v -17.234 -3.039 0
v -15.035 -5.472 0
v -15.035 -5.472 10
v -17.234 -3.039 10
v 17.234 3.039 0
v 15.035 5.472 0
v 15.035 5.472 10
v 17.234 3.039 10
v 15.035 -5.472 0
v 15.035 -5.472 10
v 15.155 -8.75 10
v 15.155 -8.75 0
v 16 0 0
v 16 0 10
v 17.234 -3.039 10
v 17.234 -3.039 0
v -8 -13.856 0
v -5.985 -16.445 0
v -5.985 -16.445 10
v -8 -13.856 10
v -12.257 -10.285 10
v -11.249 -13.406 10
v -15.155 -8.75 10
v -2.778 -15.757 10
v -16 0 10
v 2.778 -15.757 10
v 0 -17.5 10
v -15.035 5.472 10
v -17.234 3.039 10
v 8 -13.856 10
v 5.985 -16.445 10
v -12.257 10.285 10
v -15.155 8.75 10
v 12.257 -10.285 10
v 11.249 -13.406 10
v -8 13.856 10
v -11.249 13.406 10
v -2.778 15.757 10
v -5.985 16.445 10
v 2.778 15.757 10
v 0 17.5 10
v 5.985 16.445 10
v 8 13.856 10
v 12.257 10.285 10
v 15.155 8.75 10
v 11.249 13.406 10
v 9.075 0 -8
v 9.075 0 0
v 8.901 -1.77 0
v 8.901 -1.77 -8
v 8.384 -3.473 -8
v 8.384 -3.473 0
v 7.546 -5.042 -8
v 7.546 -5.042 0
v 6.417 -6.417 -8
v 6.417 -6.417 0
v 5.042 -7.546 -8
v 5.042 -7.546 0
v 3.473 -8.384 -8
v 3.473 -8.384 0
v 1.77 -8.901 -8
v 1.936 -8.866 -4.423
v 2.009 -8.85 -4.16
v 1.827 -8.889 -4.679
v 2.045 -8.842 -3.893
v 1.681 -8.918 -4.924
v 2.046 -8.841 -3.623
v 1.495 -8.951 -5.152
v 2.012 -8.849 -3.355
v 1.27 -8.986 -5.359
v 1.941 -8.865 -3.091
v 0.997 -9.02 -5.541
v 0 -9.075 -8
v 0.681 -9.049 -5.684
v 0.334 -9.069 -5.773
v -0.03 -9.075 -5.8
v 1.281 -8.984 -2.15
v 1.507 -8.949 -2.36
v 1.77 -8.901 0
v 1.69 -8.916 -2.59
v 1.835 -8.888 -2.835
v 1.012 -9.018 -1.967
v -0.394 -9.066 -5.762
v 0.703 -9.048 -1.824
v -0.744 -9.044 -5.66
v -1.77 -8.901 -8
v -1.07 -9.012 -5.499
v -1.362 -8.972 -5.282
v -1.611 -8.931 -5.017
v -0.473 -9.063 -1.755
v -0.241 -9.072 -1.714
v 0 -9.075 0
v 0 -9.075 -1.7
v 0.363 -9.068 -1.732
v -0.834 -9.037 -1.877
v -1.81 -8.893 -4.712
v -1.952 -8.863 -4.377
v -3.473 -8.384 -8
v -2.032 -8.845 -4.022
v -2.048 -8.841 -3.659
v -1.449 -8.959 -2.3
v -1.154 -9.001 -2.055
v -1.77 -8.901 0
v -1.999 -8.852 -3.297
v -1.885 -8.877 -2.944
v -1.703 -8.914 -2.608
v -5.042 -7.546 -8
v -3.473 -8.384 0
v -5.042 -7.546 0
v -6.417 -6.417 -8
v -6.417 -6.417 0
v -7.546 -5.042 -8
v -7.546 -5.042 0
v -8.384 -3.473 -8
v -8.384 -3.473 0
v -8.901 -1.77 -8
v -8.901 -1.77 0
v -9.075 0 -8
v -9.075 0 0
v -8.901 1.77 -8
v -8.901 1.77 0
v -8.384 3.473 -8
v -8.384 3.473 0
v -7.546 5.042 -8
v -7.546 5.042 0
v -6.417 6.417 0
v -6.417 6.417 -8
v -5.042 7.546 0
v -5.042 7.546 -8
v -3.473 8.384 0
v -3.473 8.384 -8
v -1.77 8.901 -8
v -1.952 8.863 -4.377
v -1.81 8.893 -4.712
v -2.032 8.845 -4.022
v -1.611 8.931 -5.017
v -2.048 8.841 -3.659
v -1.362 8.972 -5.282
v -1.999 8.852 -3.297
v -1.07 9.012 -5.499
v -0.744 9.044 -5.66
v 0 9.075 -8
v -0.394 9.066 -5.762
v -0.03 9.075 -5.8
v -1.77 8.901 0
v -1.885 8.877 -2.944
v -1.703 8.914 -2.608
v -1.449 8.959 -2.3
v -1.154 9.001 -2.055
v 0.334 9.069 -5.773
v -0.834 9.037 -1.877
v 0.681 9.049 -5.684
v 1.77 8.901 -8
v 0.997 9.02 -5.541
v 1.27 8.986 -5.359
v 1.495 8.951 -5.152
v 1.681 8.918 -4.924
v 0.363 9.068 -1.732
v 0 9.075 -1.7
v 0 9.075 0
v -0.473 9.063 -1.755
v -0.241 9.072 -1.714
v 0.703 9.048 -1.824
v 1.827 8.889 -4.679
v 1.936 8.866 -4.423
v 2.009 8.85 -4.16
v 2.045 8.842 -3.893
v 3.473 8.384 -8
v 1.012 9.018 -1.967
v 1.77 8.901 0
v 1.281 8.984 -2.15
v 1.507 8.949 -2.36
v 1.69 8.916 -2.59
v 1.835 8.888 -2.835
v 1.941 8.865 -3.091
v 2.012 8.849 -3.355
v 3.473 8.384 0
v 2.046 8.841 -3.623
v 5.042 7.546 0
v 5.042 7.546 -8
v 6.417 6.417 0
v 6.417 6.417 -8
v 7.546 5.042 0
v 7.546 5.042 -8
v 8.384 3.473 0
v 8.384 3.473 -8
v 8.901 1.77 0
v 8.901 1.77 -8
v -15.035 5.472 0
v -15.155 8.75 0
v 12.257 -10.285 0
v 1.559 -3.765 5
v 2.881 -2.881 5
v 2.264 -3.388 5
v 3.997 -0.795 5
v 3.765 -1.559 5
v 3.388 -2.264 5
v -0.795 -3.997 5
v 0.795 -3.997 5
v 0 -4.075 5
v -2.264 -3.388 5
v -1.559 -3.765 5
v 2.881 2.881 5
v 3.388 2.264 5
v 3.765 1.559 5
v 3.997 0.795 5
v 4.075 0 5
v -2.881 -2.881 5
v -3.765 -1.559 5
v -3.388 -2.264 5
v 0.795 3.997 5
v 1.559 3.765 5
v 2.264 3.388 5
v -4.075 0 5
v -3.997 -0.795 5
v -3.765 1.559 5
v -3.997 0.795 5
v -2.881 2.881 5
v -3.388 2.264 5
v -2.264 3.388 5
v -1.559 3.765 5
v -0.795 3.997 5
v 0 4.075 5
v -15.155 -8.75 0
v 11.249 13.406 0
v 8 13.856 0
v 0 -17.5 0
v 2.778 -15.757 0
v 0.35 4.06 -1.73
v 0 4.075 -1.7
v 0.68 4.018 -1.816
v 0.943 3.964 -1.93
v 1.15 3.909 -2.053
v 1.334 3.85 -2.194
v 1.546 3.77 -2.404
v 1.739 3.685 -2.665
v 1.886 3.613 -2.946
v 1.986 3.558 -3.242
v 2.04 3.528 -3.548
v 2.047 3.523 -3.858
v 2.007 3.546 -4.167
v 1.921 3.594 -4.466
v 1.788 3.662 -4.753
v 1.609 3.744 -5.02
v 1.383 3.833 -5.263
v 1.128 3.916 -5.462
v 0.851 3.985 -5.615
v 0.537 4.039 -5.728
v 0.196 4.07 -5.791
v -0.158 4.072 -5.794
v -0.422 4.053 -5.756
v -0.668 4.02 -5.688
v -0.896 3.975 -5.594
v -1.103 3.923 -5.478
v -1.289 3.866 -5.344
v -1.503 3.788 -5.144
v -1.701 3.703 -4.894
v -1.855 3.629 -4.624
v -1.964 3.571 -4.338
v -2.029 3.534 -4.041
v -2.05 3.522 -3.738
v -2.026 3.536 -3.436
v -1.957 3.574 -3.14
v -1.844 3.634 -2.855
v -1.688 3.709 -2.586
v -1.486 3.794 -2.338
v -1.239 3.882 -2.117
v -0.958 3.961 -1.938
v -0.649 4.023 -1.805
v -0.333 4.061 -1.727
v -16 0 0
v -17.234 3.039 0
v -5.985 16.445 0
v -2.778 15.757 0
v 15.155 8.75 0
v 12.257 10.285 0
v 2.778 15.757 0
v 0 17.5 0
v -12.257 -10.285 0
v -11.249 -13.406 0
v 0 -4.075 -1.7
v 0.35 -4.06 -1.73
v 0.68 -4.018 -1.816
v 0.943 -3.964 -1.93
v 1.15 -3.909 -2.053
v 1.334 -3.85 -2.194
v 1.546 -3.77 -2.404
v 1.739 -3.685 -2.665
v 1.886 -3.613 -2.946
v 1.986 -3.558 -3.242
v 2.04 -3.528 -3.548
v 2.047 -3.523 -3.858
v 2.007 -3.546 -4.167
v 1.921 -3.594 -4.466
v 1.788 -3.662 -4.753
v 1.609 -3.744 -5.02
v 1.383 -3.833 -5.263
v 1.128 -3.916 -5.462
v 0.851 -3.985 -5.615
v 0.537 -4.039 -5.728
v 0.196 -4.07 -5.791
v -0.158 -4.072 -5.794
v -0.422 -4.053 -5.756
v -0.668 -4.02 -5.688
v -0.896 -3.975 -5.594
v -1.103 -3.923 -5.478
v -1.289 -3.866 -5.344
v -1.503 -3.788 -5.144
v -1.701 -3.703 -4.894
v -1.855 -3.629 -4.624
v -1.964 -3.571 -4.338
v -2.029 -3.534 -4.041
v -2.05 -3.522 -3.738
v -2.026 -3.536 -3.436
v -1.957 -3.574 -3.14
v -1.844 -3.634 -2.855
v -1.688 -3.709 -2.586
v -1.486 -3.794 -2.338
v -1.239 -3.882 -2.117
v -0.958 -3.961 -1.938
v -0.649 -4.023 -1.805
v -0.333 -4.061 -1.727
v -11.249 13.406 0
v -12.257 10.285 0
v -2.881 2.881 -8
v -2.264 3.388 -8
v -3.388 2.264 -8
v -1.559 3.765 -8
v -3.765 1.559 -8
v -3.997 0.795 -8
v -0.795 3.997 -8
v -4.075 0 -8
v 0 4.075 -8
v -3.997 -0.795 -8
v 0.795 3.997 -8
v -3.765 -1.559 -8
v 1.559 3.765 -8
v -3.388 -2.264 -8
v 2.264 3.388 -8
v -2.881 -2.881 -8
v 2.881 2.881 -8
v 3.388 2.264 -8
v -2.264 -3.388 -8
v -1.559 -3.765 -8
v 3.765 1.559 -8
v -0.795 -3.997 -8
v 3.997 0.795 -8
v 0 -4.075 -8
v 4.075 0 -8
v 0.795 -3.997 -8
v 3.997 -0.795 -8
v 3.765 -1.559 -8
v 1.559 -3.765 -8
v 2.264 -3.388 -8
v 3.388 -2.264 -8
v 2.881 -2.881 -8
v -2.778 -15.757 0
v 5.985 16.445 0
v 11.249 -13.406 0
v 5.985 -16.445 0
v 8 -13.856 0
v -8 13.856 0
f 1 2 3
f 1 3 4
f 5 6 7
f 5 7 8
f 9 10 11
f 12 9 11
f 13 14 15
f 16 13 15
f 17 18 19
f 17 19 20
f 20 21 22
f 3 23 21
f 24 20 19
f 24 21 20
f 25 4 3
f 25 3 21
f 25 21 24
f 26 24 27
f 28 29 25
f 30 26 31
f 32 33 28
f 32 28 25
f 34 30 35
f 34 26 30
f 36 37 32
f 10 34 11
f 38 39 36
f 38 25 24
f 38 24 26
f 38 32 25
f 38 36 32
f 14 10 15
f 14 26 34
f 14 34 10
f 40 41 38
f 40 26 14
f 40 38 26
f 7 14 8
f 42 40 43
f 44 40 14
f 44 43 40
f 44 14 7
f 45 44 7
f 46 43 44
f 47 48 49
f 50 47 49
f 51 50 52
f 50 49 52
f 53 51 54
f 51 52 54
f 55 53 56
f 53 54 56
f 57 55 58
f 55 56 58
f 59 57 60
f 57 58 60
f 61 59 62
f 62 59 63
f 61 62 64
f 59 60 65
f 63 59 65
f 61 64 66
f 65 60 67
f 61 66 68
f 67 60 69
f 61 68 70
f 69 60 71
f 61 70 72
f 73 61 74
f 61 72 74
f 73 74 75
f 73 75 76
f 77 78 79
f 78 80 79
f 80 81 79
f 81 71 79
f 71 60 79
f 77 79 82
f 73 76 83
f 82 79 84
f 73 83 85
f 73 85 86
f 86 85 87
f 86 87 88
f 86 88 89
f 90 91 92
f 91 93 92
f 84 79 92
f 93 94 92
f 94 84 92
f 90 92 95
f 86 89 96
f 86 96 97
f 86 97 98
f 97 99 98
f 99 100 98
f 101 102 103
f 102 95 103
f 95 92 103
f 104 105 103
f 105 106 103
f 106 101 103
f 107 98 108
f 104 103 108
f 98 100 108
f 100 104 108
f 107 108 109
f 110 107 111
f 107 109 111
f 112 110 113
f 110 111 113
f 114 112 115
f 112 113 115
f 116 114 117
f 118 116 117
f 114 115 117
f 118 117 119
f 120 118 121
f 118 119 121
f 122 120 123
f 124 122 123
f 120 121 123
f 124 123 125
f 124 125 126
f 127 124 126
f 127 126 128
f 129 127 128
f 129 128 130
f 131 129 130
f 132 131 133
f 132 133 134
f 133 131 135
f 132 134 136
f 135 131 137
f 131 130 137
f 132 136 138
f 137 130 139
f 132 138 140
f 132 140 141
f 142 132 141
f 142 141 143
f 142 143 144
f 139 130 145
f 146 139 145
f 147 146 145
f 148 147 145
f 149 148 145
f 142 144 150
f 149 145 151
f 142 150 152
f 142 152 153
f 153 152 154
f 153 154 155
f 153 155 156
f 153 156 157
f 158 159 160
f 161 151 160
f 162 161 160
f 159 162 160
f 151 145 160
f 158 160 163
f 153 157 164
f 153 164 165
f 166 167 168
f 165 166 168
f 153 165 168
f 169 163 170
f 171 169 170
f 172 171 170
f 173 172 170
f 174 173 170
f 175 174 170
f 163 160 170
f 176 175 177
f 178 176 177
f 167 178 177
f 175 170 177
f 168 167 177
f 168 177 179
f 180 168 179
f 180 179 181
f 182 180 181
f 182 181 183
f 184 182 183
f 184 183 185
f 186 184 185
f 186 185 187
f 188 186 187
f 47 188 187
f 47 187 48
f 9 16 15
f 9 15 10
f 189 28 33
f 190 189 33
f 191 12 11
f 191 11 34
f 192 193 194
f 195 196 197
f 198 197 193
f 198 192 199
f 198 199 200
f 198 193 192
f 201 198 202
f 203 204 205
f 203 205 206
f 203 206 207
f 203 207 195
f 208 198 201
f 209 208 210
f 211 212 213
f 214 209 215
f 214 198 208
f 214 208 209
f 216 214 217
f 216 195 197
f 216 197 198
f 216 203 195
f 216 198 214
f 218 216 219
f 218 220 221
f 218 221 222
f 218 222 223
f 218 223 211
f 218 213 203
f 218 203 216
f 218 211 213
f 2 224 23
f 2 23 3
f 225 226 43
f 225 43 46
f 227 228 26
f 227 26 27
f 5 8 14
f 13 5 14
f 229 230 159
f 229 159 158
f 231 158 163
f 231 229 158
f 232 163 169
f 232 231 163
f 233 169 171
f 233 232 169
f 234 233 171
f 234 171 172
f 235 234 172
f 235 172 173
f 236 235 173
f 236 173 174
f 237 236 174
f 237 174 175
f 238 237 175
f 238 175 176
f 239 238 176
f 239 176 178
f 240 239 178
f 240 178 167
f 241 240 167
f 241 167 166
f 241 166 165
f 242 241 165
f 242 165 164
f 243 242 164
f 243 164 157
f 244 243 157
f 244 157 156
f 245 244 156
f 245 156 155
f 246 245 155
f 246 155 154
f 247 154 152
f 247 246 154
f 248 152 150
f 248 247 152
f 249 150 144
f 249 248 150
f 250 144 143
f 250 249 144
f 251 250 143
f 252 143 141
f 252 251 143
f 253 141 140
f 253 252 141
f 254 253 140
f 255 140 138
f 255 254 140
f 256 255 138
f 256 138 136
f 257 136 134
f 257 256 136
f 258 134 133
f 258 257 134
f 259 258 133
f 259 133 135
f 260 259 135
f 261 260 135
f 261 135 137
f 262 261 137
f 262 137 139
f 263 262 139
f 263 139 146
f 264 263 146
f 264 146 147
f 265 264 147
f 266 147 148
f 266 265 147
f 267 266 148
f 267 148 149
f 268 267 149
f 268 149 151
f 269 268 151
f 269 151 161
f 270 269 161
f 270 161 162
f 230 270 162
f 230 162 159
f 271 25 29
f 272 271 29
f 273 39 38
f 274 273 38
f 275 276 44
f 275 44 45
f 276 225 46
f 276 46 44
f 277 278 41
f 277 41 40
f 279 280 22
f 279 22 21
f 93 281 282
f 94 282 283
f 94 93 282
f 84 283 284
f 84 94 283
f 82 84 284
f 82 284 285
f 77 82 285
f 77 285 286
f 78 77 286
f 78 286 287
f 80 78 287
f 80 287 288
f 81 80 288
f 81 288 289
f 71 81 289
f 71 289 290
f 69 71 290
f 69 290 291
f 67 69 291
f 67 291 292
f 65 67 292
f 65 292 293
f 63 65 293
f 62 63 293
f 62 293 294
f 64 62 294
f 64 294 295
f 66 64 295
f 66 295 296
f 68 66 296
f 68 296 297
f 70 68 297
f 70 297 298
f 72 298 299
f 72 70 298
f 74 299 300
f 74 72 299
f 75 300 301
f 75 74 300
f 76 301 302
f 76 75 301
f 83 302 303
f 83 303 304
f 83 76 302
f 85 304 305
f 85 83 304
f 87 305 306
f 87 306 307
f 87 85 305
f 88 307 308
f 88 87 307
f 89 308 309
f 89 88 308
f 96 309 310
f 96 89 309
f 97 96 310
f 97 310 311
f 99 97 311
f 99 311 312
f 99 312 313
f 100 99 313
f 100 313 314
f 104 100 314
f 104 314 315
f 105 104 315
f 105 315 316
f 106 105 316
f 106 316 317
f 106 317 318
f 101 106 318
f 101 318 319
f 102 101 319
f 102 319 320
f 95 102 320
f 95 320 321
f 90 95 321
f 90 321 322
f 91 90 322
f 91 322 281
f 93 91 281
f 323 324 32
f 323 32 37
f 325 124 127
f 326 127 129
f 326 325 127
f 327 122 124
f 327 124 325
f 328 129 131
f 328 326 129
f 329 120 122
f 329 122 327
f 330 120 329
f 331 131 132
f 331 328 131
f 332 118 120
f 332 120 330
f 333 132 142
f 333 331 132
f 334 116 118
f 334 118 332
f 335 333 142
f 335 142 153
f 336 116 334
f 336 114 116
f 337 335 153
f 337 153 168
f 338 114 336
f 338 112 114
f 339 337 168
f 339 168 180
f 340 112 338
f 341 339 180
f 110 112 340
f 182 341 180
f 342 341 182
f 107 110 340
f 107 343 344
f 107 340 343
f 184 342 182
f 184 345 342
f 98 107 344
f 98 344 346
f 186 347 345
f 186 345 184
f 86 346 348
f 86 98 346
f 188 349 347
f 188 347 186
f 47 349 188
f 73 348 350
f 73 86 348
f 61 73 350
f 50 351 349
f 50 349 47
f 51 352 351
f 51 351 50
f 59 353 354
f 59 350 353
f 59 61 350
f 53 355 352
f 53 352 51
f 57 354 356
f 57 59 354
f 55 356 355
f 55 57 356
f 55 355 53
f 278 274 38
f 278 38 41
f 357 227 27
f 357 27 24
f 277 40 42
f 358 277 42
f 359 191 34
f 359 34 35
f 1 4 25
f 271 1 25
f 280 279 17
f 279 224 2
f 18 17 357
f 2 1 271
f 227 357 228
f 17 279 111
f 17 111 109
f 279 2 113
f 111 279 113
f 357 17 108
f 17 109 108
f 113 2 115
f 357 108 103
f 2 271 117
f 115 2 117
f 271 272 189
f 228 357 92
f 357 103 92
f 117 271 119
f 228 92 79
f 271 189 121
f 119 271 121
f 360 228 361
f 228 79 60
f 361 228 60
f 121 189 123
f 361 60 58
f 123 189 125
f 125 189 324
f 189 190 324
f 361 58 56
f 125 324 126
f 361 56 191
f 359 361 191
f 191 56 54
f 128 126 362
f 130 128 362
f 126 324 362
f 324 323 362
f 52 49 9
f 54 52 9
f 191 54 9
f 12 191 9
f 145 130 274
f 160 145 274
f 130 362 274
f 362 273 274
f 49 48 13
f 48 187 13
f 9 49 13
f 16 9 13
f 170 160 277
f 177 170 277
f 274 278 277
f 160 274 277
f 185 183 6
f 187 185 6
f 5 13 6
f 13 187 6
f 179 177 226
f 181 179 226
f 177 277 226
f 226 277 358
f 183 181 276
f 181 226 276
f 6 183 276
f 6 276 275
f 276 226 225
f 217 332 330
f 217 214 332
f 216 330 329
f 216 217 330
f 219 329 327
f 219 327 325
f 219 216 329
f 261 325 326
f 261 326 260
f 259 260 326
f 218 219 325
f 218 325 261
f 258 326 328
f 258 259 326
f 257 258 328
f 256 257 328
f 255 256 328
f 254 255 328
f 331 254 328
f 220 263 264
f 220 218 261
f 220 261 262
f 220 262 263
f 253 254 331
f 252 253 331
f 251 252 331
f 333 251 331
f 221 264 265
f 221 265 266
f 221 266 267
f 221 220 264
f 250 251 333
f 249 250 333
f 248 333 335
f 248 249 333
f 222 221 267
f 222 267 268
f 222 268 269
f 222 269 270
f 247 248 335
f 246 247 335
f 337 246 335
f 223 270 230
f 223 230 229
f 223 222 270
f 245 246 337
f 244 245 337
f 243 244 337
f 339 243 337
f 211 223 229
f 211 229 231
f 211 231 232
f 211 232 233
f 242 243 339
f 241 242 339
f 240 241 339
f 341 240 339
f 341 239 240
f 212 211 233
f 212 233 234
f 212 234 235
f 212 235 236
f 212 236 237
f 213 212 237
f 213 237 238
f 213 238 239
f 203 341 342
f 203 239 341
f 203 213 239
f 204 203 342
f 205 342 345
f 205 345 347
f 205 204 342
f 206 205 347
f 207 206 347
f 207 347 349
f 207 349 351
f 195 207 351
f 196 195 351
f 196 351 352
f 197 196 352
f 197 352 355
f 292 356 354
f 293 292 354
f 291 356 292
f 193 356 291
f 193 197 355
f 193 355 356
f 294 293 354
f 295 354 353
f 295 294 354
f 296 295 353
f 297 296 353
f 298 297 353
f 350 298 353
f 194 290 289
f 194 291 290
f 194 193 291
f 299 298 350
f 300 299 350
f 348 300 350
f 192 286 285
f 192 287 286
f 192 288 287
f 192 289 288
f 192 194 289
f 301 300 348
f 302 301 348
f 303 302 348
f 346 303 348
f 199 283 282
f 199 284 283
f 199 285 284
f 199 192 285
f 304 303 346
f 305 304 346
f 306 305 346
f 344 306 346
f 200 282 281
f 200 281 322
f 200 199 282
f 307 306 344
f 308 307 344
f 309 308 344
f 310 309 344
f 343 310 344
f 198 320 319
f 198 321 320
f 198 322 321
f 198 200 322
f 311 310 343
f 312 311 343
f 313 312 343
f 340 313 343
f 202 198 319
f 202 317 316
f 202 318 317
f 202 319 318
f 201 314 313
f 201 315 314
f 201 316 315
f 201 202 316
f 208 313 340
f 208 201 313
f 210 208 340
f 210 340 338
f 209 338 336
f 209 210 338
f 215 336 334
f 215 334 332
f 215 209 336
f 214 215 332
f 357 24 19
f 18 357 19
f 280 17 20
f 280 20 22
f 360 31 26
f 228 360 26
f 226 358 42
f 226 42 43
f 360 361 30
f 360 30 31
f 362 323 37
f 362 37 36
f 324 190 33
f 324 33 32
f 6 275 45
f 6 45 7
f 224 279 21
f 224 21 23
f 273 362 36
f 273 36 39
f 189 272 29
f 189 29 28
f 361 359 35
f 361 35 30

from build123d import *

# Parameters (mm, degrees)
CROQUIS1_R                 = 17.5
SALIENTE_EXTRUIR1_DEPTH    = 10
CROQUIS2_R                 = 9.075
CROQUIS2_R_2               = 4.075
SALIENTE_EXTRUIR2_DEPTH    = 8
CORTAR_EXTRUIR1_START      = -10
CROQUIS3_R                 = 19
CORTAR_EXTRUIR1_DEPTH      = 10
CORTAR_EXTRUIR2_DEPTH      = 27.519152184
CORTAR_EXTRUIR2_DEPTH_BACK = 27.519152184
CROQUIS4_R                 = 2.05
CORTAR_EXTRUIR3_START      = -5
CROQUIS5_R                 = 4.075
CORTAR_EXTRUIR3_DEPTH      = 5


with BuildPart() as part:
    # Croquis1 → Saliente-Extruir1 (new body)
    with BuildSketch(Plane.XY):
        Circle(CROQUIS1_R)
    extrude(amount=SALIENTE_EXTRUIR1_DEPTH)

    # Croquis2 → Saliente-Extruir2 (add)
    with BuildSketch(Plane(origin=(0, 0, 0), x_dir=(-1, 0, 0), z_dir=(0, 0, -1))):
        with Locations(Location((0, 0, 0), (0, 0, 180))):
            Circle(CROQUIS2_R)
        Circle(CROQUIS2_R_2, mode=Mode.SUBTRACT)
    extrude(amount=SALIENTE_EXTRUIR2_DEPTH)

    # Croquis3 → Cortar-Extruir1 (cut)
    with BuildSketch(Plane.XY.offset(10).offset(CORTAR_EXTRUIR1_START)):
        Circle(CROQUIS3_R)
        Polygon((0, 17.5), (2.778370843, 15.756924048), (5.985352508, 16.444620864), (8, 13.856406461), (11.24878317, 13.405777755), (12.25671109, 10.284601755), (15.155444566, 8.75), (15.035081933, 5.472322293), (17.234135678, 3.038843109), (16, 0), (17.234135678, -3.038843109), (15.035081933, -5.472322293), (15.155444566, -8.75), (12.25671109, -10.284601755), (11.24878317, -13.405777755), (8, -13.856406461), (5.985352508, -16.444620864), (2.778370843, -15.756924048), (0, -17.5), (-2.778370843, -15.756924048), (-5.985352508, -16.444620864), (-8, -13.856406461), (-11.24878317, -13.405777755), (-12.25671109, -10.284601755), (-15.155444566, -8.75), (-15.035081933, -5.472322293), (-17.234135678, -3.038843109), (-16, 0), (-17.234135678, 3.038843109), (-15.035081933, 5.472322293), (-15.155444566, 8.75), (-12.25671109, 10.284601755), (-11.24878317, 13.405777755), (-8, 13.856406461), (-5.985352508, 16.444620864), (-2.778370843, 15.756924048), align=None, mode=Mode.SUBTRACT)
    extrude(amount=CORTAR_EXTRUIR1_DEPTH, mode=Mode.SUBTRACT)

    # Croquis4 → Cortar-Extruir2 (cut, two sides: drawn at the far end of the back side and taken through both)
    with BuildSketch(Plane(origin=(0, 0, 0), x_dir=(1, 0, 0), z_dir=(0, 1, 0)).offset(-CORTAR_EXTRUIR2_DEPTH_BACK)):
        with Locations(Location((0, 3.75, 0), (0, 0, 270))):
            Circle(CROQUIS4_R)
    extrude(amount=CORTAR_EXTRUIR2_DEPTH + CORTAR_EXTRUIR2_DEPTH_BACK, mode=Mode.SUBTRACT)

    # Croquis5 → Cortar-Extruir3 (cut)
    with BuildSketch(Plane(origin=(0, 0, 0), x_dir=(-1, 0, 0), z_dir=(0, 0, -1)).offset(CORTAR_EXTRUIR3_START)):
        Circle(CROQUIS5_R)
    extrude(amount=CORTAR_EXTRUIR3_DEPTH, mode=Mode.SUBTRACT)


solid = part.part
